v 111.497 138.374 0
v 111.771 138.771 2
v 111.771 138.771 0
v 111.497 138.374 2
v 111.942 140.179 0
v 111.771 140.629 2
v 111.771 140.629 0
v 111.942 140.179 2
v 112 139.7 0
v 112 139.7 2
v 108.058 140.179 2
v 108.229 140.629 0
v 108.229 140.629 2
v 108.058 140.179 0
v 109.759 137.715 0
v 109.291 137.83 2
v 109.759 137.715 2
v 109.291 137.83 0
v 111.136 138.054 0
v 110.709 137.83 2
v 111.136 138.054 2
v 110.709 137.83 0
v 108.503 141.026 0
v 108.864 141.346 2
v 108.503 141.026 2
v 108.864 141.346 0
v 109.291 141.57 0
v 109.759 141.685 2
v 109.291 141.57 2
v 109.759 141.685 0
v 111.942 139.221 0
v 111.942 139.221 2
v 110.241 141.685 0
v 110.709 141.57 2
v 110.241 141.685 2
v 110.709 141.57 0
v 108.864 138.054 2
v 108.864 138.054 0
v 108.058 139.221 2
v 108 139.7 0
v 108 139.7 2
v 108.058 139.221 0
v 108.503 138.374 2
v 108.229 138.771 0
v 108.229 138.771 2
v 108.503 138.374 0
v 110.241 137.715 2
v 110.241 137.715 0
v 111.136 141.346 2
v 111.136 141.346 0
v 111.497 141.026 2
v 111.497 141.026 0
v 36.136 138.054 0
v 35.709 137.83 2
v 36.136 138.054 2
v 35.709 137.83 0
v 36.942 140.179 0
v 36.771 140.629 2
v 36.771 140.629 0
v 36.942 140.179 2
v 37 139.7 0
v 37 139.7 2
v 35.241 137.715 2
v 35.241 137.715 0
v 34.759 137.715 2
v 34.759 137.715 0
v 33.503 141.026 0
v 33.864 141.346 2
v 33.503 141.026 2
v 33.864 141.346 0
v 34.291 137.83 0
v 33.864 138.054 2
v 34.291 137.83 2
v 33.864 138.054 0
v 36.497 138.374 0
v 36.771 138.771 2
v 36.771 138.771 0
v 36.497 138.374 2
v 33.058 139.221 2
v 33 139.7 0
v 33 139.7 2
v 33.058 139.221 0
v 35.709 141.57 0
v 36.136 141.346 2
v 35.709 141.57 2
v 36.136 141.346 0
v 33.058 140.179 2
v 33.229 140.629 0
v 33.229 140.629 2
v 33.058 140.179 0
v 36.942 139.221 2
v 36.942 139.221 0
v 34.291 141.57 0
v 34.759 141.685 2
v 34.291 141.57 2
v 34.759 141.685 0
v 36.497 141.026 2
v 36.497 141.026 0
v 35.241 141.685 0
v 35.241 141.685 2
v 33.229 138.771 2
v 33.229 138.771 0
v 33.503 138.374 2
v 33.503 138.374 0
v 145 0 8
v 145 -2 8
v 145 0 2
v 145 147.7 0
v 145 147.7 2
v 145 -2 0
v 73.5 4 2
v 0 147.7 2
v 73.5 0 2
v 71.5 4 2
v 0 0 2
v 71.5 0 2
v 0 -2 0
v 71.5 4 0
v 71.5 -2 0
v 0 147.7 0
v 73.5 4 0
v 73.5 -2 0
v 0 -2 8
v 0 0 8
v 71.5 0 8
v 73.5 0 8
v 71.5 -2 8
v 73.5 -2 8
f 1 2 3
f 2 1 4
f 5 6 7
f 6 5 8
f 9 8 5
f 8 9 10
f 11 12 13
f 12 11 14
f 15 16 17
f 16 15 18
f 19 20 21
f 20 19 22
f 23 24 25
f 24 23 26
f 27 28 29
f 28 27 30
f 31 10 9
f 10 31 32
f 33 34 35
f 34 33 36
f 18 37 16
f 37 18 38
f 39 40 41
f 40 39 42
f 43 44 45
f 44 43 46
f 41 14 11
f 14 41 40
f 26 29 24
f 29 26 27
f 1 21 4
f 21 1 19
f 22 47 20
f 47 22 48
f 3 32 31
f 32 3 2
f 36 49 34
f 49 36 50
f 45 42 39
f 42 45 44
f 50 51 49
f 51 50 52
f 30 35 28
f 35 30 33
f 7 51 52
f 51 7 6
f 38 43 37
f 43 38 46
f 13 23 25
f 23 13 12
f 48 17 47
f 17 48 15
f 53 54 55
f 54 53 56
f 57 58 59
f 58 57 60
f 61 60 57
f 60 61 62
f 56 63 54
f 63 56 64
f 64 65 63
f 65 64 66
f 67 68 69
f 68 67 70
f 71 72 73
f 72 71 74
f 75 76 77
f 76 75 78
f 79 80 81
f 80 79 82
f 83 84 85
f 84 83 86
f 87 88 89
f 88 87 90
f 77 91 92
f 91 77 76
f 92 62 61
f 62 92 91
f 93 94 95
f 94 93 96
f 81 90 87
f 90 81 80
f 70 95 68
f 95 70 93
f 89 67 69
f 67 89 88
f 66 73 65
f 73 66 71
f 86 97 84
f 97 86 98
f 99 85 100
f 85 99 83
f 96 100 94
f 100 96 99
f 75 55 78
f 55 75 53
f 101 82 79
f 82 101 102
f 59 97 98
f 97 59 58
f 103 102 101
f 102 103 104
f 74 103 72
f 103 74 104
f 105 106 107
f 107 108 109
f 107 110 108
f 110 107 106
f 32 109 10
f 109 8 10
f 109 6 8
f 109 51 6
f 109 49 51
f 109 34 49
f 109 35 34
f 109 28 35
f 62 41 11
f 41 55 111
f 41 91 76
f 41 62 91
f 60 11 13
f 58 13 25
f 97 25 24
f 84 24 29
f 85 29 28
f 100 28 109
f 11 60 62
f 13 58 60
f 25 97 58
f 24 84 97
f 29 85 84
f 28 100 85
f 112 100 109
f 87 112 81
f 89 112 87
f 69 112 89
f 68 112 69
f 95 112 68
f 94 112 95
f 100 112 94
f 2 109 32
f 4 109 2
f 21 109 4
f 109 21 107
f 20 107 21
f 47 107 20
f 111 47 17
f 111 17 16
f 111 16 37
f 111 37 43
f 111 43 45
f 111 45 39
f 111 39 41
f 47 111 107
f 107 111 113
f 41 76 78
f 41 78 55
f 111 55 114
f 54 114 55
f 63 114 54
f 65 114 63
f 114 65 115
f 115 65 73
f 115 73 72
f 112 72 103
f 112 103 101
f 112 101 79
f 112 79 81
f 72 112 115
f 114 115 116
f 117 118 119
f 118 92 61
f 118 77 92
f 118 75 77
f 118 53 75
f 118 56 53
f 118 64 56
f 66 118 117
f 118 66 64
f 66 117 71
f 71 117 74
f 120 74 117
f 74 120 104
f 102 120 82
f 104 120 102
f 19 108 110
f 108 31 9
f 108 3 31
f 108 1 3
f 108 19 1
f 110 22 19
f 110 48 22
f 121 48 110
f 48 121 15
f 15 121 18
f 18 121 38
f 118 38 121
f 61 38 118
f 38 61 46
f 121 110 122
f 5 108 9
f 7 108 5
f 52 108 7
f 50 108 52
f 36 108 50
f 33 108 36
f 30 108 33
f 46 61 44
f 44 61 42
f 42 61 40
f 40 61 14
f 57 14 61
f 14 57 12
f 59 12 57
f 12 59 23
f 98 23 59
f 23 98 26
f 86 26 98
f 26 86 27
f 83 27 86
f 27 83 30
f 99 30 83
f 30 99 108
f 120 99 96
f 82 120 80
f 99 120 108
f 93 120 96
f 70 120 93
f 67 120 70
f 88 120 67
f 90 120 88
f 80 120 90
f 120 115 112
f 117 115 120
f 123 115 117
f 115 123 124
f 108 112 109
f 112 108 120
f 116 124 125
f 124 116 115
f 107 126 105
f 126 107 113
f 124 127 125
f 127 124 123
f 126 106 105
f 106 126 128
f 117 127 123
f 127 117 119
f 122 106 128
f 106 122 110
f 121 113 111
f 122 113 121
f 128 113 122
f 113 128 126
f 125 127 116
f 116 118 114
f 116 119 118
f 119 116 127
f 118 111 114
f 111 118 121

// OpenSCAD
// file: lib/jig.scad
/******************************************************************************/
default_thickness = 2; // Thickness of the jig.
default_hole_diameter = 4;  // Size of hole to cut out of jig.

/******************************************************************************/
/*

  A single pole knob.

  Only requires that a single hole be cut out of the jig.

*/
module single_pole_knob(
  /* What size hole should be cut out of the jig? */
    hole_diameter = default_hole_diameter)
{
  height = 10;
  cylinder(d=hole_diameter, h=height, center=true);
}

/******************************************************************************/
/*

  A handle with two attachment points.

*/
module dual_pole_handle(
  /* Distance between the centers of the two poles. */
  pole_distance,

  /* What size hole should be cut out of the jig? */
  hole_diameter = default_hole_diameter)
{
  offset = pole_distance/2;

  for (i = [offset, -offset]) {
    translate([i, 0, 0])
      single_pole_knob(hole_diameter=hole_diameter);
  }
}

/******************************************************************************/
/*

  A jig for drilling holes in a cabinet door.

  Give the handle as a child object.
*/
module door_jig(
  /*
    How wide is the trim piece on the door?  The handle will be placed
    in the center of the trim.
  */
  width,

  /*
    How far from the bottom (or top) edge of the door to place the
    center of then handle?  If not given defaults to the `width'
    value.
  */
  handle_center,

  /*
    How thick do you want the jig to be?
  */
  thickness = default_thickness)
{
  height = handle_center == undef ? width * 2 : handle_center * 2;

  union() {
    difference() {
      // Plate.
      cube([width, height, thickness]);

      // Hole(s).
      translate([width/2, height/2, 0])
        rotate([0, 0, 90])
          children();
    }

    // Long edge.
    translate([-thickness, -thickness, 0])
      cube(size=[thickness, height+thickness, thickness*4]);

    // Short edge.
    translate([0, -thickness, 0])
      cube(size=[width, thickness, thickness*4]);
  }
}

/******************************************************************************/
/*

  A jig for drilling holes in a cabinet drawer.

  Give the handle as a child object.

*/
module drawer_jig(
  /*
    What is the height of the drawer?  The handle will be placed in
    the center of the drawer.  The jig will be slightly larger than
    half of this value.
  */
  height,

  /*
    How wide to make the jig.  A good value is the total width of the
    handle, maybe a little wider.
  */
  width,

  /*
    How thick do you want the jig to be?
  */
  thickness = default_thickness)
{
  edge_height = thickness * 4;

  jig_height = height / 2 + edge_height;
  jig_width = width;

  hole_x = jig_width / 2;
  hole_y = height / 2;

  difference() {
    union() {
      difference() {
        // Plate:
        cube([jig_width, jig_height, thickness]);

        // Holes:
        translate([hole_x, hole_y, 0])
          children();
      }

      // Edge:
      translate([0, -thickness, 0])
        cube([jig_width, thickness, edge_height]);
    }

    // Cut out to mark the center of the jig:
    translate([hole_x, 0, edge_height/2])
      cube(
        size=[thickness, edge_height, edge_height],
        center=true);
  }
}
// main file
/******************************************************************************/
use <lib/jig.scad>

/******************************************************************************/
$fa = 1.0;
$fs = 0.5;

/******************************************************************************/
drawer_jig(height=279.4, width=145) {

  dual_pole_handle(pole_distance=75);

  /* Or:
     single_pole_knob();
  */
};
